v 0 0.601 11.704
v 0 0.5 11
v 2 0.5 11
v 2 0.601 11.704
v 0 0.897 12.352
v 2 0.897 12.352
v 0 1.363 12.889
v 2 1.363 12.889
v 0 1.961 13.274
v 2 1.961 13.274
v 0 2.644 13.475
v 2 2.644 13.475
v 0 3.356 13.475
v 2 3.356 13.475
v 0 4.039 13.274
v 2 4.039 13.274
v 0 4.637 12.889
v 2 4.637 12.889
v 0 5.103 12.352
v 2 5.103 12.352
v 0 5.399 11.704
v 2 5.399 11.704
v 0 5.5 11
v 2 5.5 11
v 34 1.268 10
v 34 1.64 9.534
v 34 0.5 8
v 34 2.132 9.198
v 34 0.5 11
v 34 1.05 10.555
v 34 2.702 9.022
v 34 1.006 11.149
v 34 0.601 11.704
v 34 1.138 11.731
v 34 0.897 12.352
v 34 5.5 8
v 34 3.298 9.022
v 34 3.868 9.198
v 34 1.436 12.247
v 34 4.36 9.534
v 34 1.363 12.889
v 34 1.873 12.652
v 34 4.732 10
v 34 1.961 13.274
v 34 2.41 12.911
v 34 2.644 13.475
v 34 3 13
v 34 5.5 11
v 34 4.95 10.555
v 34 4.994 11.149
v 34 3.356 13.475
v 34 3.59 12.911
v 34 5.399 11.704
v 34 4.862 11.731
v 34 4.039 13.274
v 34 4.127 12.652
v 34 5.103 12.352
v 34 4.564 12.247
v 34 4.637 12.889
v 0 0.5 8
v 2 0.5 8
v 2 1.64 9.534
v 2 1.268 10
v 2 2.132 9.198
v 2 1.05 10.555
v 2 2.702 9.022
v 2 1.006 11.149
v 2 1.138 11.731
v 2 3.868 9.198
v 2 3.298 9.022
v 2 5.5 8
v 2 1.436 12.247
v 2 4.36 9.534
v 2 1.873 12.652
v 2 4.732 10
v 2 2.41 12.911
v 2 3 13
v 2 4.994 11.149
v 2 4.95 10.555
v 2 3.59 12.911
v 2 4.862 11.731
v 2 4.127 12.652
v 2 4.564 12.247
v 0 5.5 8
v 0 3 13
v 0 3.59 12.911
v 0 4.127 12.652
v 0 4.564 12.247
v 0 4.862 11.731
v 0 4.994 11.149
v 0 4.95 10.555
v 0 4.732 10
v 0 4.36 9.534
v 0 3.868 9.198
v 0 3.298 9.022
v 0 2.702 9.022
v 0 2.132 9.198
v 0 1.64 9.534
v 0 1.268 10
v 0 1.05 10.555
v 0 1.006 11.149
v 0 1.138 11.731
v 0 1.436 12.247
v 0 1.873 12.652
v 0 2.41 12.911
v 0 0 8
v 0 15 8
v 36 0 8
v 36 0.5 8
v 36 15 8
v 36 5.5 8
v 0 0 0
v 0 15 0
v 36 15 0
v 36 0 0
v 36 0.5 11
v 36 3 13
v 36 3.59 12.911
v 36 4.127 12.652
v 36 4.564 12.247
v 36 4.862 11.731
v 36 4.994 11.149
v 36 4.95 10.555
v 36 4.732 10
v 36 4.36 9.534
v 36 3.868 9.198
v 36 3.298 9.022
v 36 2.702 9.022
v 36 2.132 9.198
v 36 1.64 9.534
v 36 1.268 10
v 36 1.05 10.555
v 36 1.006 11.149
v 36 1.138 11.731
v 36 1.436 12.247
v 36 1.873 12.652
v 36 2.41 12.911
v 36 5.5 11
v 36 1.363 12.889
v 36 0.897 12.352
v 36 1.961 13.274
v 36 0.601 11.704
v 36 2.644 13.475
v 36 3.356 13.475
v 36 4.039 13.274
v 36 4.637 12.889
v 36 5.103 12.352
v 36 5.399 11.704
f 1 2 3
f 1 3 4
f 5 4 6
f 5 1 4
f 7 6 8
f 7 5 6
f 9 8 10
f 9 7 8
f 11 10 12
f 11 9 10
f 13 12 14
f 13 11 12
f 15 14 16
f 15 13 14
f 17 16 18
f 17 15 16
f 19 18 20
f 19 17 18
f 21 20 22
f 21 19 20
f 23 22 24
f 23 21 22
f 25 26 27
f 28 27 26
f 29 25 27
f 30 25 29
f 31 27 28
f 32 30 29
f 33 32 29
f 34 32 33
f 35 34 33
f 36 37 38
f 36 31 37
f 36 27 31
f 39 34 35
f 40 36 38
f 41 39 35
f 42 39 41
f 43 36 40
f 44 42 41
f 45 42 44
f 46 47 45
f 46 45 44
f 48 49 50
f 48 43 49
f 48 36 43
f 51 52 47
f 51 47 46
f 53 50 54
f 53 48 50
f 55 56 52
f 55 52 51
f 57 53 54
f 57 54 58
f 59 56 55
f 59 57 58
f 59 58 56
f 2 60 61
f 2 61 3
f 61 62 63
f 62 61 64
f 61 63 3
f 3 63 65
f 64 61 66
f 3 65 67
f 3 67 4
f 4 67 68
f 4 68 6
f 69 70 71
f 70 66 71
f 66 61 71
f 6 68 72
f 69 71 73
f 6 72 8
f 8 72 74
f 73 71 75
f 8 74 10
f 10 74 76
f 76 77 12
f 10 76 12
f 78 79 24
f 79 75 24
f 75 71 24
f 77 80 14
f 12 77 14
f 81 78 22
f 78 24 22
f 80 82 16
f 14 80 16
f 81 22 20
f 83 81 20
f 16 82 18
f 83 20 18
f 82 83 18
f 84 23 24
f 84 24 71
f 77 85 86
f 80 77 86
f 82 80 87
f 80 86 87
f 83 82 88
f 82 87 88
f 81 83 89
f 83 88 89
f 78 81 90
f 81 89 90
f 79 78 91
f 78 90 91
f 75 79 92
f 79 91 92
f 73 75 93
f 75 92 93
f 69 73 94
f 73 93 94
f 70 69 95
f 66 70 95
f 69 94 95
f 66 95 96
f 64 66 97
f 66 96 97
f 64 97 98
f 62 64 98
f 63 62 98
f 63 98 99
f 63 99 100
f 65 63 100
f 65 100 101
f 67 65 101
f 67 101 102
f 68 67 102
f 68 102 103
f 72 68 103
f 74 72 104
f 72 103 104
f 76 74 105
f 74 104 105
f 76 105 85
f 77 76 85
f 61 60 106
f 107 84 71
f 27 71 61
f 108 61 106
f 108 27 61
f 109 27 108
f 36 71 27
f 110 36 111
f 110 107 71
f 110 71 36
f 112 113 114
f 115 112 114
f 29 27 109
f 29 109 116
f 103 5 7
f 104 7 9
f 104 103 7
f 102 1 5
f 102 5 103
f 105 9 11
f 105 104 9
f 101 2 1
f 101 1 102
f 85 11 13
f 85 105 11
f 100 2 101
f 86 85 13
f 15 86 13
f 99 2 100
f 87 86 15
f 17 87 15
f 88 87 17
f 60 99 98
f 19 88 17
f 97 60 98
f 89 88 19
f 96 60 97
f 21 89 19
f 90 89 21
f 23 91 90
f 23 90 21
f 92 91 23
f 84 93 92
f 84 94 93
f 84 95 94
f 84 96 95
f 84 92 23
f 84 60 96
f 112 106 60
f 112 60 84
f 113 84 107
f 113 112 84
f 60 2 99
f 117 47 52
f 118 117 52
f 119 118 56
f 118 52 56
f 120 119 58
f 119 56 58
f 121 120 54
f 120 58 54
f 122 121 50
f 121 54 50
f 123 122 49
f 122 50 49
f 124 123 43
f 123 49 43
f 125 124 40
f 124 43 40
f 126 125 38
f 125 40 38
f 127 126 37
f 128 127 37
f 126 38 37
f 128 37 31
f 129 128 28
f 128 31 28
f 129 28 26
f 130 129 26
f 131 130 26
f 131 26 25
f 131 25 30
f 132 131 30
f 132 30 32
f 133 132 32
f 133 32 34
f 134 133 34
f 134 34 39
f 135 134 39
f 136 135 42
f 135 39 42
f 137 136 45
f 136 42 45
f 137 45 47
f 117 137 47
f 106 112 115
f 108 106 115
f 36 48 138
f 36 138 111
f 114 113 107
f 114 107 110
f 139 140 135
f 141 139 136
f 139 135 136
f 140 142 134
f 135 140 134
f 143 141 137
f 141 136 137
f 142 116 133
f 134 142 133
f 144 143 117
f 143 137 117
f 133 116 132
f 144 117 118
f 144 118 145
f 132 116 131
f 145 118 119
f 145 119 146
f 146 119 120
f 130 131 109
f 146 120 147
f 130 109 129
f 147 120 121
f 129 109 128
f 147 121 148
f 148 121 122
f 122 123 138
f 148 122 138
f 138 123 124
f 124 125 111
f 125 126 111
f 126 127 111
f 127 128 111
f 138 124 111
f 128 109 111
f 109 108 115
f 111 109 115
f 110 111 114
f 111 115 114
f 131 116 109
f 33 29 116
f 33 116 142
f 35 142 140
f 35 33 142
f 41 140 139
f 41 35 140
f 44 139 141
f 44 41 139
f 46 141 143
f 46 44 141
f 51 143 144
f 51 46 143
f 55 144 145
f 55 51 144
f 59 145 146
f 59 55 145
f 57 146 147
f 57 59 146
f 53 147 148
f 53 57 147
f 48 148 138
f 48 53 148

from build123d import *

# Parameters (mm, degrees)
ESQUISSE1_W                = 36
ESQUISSE1_H                = 15
BOSS_EXTRU_3_DEPTH         = 8
ESQUISSE2_R                = 2
BOSS_EXTRU_4_DEPTH         = 2
R_P_TITION_LIN_AIRE1_COUNT = 2
R_P_TITION_LIN_AIRE1_PITCH = 34


with BuildPart() as part:
    # Esquisse1 → Boss.-Extru.3 (new body)
    with BuildSketch(Plane.XY):
        with Locations((18, 7.5)):
            Rectangle(ESQUISSE1_W, ESQUISSE1_H)
    extrude(amount=BOSS_EXTRU_3_DEPTH)

    # Esquisse2 → Boss.-Extru.4 (add)
    with BuildSketch(Plane.ZY):
        with BuildLine():
            Line((11, 5.5), (8, 5.5))
            Line((8, 5.5), (8, 0.5))
            Line((8, 0.5), (11, 0.5))
            ThreePointArc((11, 0.5), (13.5, 3), (11, 5.5))
        make_face()
        with Locations((11, 3)):
            Circle(ESQUISSE2_R, mode=Mode.SUBTRACT)
    boss_extru_4 = extrude(amount=-BOSS_EXTRU_4_DEPTH)

    # Répétition linéaire1: Boss.-Extru.4 ×2
    with Locations(*[(i * R_P_TITION_LIN_AIRE1_PITCH, 0, 0) for i in range(1, R_P_TITION_LIN_AIRE1_COUNT)]):
        add(boss_extru_4)


solid = part.part
